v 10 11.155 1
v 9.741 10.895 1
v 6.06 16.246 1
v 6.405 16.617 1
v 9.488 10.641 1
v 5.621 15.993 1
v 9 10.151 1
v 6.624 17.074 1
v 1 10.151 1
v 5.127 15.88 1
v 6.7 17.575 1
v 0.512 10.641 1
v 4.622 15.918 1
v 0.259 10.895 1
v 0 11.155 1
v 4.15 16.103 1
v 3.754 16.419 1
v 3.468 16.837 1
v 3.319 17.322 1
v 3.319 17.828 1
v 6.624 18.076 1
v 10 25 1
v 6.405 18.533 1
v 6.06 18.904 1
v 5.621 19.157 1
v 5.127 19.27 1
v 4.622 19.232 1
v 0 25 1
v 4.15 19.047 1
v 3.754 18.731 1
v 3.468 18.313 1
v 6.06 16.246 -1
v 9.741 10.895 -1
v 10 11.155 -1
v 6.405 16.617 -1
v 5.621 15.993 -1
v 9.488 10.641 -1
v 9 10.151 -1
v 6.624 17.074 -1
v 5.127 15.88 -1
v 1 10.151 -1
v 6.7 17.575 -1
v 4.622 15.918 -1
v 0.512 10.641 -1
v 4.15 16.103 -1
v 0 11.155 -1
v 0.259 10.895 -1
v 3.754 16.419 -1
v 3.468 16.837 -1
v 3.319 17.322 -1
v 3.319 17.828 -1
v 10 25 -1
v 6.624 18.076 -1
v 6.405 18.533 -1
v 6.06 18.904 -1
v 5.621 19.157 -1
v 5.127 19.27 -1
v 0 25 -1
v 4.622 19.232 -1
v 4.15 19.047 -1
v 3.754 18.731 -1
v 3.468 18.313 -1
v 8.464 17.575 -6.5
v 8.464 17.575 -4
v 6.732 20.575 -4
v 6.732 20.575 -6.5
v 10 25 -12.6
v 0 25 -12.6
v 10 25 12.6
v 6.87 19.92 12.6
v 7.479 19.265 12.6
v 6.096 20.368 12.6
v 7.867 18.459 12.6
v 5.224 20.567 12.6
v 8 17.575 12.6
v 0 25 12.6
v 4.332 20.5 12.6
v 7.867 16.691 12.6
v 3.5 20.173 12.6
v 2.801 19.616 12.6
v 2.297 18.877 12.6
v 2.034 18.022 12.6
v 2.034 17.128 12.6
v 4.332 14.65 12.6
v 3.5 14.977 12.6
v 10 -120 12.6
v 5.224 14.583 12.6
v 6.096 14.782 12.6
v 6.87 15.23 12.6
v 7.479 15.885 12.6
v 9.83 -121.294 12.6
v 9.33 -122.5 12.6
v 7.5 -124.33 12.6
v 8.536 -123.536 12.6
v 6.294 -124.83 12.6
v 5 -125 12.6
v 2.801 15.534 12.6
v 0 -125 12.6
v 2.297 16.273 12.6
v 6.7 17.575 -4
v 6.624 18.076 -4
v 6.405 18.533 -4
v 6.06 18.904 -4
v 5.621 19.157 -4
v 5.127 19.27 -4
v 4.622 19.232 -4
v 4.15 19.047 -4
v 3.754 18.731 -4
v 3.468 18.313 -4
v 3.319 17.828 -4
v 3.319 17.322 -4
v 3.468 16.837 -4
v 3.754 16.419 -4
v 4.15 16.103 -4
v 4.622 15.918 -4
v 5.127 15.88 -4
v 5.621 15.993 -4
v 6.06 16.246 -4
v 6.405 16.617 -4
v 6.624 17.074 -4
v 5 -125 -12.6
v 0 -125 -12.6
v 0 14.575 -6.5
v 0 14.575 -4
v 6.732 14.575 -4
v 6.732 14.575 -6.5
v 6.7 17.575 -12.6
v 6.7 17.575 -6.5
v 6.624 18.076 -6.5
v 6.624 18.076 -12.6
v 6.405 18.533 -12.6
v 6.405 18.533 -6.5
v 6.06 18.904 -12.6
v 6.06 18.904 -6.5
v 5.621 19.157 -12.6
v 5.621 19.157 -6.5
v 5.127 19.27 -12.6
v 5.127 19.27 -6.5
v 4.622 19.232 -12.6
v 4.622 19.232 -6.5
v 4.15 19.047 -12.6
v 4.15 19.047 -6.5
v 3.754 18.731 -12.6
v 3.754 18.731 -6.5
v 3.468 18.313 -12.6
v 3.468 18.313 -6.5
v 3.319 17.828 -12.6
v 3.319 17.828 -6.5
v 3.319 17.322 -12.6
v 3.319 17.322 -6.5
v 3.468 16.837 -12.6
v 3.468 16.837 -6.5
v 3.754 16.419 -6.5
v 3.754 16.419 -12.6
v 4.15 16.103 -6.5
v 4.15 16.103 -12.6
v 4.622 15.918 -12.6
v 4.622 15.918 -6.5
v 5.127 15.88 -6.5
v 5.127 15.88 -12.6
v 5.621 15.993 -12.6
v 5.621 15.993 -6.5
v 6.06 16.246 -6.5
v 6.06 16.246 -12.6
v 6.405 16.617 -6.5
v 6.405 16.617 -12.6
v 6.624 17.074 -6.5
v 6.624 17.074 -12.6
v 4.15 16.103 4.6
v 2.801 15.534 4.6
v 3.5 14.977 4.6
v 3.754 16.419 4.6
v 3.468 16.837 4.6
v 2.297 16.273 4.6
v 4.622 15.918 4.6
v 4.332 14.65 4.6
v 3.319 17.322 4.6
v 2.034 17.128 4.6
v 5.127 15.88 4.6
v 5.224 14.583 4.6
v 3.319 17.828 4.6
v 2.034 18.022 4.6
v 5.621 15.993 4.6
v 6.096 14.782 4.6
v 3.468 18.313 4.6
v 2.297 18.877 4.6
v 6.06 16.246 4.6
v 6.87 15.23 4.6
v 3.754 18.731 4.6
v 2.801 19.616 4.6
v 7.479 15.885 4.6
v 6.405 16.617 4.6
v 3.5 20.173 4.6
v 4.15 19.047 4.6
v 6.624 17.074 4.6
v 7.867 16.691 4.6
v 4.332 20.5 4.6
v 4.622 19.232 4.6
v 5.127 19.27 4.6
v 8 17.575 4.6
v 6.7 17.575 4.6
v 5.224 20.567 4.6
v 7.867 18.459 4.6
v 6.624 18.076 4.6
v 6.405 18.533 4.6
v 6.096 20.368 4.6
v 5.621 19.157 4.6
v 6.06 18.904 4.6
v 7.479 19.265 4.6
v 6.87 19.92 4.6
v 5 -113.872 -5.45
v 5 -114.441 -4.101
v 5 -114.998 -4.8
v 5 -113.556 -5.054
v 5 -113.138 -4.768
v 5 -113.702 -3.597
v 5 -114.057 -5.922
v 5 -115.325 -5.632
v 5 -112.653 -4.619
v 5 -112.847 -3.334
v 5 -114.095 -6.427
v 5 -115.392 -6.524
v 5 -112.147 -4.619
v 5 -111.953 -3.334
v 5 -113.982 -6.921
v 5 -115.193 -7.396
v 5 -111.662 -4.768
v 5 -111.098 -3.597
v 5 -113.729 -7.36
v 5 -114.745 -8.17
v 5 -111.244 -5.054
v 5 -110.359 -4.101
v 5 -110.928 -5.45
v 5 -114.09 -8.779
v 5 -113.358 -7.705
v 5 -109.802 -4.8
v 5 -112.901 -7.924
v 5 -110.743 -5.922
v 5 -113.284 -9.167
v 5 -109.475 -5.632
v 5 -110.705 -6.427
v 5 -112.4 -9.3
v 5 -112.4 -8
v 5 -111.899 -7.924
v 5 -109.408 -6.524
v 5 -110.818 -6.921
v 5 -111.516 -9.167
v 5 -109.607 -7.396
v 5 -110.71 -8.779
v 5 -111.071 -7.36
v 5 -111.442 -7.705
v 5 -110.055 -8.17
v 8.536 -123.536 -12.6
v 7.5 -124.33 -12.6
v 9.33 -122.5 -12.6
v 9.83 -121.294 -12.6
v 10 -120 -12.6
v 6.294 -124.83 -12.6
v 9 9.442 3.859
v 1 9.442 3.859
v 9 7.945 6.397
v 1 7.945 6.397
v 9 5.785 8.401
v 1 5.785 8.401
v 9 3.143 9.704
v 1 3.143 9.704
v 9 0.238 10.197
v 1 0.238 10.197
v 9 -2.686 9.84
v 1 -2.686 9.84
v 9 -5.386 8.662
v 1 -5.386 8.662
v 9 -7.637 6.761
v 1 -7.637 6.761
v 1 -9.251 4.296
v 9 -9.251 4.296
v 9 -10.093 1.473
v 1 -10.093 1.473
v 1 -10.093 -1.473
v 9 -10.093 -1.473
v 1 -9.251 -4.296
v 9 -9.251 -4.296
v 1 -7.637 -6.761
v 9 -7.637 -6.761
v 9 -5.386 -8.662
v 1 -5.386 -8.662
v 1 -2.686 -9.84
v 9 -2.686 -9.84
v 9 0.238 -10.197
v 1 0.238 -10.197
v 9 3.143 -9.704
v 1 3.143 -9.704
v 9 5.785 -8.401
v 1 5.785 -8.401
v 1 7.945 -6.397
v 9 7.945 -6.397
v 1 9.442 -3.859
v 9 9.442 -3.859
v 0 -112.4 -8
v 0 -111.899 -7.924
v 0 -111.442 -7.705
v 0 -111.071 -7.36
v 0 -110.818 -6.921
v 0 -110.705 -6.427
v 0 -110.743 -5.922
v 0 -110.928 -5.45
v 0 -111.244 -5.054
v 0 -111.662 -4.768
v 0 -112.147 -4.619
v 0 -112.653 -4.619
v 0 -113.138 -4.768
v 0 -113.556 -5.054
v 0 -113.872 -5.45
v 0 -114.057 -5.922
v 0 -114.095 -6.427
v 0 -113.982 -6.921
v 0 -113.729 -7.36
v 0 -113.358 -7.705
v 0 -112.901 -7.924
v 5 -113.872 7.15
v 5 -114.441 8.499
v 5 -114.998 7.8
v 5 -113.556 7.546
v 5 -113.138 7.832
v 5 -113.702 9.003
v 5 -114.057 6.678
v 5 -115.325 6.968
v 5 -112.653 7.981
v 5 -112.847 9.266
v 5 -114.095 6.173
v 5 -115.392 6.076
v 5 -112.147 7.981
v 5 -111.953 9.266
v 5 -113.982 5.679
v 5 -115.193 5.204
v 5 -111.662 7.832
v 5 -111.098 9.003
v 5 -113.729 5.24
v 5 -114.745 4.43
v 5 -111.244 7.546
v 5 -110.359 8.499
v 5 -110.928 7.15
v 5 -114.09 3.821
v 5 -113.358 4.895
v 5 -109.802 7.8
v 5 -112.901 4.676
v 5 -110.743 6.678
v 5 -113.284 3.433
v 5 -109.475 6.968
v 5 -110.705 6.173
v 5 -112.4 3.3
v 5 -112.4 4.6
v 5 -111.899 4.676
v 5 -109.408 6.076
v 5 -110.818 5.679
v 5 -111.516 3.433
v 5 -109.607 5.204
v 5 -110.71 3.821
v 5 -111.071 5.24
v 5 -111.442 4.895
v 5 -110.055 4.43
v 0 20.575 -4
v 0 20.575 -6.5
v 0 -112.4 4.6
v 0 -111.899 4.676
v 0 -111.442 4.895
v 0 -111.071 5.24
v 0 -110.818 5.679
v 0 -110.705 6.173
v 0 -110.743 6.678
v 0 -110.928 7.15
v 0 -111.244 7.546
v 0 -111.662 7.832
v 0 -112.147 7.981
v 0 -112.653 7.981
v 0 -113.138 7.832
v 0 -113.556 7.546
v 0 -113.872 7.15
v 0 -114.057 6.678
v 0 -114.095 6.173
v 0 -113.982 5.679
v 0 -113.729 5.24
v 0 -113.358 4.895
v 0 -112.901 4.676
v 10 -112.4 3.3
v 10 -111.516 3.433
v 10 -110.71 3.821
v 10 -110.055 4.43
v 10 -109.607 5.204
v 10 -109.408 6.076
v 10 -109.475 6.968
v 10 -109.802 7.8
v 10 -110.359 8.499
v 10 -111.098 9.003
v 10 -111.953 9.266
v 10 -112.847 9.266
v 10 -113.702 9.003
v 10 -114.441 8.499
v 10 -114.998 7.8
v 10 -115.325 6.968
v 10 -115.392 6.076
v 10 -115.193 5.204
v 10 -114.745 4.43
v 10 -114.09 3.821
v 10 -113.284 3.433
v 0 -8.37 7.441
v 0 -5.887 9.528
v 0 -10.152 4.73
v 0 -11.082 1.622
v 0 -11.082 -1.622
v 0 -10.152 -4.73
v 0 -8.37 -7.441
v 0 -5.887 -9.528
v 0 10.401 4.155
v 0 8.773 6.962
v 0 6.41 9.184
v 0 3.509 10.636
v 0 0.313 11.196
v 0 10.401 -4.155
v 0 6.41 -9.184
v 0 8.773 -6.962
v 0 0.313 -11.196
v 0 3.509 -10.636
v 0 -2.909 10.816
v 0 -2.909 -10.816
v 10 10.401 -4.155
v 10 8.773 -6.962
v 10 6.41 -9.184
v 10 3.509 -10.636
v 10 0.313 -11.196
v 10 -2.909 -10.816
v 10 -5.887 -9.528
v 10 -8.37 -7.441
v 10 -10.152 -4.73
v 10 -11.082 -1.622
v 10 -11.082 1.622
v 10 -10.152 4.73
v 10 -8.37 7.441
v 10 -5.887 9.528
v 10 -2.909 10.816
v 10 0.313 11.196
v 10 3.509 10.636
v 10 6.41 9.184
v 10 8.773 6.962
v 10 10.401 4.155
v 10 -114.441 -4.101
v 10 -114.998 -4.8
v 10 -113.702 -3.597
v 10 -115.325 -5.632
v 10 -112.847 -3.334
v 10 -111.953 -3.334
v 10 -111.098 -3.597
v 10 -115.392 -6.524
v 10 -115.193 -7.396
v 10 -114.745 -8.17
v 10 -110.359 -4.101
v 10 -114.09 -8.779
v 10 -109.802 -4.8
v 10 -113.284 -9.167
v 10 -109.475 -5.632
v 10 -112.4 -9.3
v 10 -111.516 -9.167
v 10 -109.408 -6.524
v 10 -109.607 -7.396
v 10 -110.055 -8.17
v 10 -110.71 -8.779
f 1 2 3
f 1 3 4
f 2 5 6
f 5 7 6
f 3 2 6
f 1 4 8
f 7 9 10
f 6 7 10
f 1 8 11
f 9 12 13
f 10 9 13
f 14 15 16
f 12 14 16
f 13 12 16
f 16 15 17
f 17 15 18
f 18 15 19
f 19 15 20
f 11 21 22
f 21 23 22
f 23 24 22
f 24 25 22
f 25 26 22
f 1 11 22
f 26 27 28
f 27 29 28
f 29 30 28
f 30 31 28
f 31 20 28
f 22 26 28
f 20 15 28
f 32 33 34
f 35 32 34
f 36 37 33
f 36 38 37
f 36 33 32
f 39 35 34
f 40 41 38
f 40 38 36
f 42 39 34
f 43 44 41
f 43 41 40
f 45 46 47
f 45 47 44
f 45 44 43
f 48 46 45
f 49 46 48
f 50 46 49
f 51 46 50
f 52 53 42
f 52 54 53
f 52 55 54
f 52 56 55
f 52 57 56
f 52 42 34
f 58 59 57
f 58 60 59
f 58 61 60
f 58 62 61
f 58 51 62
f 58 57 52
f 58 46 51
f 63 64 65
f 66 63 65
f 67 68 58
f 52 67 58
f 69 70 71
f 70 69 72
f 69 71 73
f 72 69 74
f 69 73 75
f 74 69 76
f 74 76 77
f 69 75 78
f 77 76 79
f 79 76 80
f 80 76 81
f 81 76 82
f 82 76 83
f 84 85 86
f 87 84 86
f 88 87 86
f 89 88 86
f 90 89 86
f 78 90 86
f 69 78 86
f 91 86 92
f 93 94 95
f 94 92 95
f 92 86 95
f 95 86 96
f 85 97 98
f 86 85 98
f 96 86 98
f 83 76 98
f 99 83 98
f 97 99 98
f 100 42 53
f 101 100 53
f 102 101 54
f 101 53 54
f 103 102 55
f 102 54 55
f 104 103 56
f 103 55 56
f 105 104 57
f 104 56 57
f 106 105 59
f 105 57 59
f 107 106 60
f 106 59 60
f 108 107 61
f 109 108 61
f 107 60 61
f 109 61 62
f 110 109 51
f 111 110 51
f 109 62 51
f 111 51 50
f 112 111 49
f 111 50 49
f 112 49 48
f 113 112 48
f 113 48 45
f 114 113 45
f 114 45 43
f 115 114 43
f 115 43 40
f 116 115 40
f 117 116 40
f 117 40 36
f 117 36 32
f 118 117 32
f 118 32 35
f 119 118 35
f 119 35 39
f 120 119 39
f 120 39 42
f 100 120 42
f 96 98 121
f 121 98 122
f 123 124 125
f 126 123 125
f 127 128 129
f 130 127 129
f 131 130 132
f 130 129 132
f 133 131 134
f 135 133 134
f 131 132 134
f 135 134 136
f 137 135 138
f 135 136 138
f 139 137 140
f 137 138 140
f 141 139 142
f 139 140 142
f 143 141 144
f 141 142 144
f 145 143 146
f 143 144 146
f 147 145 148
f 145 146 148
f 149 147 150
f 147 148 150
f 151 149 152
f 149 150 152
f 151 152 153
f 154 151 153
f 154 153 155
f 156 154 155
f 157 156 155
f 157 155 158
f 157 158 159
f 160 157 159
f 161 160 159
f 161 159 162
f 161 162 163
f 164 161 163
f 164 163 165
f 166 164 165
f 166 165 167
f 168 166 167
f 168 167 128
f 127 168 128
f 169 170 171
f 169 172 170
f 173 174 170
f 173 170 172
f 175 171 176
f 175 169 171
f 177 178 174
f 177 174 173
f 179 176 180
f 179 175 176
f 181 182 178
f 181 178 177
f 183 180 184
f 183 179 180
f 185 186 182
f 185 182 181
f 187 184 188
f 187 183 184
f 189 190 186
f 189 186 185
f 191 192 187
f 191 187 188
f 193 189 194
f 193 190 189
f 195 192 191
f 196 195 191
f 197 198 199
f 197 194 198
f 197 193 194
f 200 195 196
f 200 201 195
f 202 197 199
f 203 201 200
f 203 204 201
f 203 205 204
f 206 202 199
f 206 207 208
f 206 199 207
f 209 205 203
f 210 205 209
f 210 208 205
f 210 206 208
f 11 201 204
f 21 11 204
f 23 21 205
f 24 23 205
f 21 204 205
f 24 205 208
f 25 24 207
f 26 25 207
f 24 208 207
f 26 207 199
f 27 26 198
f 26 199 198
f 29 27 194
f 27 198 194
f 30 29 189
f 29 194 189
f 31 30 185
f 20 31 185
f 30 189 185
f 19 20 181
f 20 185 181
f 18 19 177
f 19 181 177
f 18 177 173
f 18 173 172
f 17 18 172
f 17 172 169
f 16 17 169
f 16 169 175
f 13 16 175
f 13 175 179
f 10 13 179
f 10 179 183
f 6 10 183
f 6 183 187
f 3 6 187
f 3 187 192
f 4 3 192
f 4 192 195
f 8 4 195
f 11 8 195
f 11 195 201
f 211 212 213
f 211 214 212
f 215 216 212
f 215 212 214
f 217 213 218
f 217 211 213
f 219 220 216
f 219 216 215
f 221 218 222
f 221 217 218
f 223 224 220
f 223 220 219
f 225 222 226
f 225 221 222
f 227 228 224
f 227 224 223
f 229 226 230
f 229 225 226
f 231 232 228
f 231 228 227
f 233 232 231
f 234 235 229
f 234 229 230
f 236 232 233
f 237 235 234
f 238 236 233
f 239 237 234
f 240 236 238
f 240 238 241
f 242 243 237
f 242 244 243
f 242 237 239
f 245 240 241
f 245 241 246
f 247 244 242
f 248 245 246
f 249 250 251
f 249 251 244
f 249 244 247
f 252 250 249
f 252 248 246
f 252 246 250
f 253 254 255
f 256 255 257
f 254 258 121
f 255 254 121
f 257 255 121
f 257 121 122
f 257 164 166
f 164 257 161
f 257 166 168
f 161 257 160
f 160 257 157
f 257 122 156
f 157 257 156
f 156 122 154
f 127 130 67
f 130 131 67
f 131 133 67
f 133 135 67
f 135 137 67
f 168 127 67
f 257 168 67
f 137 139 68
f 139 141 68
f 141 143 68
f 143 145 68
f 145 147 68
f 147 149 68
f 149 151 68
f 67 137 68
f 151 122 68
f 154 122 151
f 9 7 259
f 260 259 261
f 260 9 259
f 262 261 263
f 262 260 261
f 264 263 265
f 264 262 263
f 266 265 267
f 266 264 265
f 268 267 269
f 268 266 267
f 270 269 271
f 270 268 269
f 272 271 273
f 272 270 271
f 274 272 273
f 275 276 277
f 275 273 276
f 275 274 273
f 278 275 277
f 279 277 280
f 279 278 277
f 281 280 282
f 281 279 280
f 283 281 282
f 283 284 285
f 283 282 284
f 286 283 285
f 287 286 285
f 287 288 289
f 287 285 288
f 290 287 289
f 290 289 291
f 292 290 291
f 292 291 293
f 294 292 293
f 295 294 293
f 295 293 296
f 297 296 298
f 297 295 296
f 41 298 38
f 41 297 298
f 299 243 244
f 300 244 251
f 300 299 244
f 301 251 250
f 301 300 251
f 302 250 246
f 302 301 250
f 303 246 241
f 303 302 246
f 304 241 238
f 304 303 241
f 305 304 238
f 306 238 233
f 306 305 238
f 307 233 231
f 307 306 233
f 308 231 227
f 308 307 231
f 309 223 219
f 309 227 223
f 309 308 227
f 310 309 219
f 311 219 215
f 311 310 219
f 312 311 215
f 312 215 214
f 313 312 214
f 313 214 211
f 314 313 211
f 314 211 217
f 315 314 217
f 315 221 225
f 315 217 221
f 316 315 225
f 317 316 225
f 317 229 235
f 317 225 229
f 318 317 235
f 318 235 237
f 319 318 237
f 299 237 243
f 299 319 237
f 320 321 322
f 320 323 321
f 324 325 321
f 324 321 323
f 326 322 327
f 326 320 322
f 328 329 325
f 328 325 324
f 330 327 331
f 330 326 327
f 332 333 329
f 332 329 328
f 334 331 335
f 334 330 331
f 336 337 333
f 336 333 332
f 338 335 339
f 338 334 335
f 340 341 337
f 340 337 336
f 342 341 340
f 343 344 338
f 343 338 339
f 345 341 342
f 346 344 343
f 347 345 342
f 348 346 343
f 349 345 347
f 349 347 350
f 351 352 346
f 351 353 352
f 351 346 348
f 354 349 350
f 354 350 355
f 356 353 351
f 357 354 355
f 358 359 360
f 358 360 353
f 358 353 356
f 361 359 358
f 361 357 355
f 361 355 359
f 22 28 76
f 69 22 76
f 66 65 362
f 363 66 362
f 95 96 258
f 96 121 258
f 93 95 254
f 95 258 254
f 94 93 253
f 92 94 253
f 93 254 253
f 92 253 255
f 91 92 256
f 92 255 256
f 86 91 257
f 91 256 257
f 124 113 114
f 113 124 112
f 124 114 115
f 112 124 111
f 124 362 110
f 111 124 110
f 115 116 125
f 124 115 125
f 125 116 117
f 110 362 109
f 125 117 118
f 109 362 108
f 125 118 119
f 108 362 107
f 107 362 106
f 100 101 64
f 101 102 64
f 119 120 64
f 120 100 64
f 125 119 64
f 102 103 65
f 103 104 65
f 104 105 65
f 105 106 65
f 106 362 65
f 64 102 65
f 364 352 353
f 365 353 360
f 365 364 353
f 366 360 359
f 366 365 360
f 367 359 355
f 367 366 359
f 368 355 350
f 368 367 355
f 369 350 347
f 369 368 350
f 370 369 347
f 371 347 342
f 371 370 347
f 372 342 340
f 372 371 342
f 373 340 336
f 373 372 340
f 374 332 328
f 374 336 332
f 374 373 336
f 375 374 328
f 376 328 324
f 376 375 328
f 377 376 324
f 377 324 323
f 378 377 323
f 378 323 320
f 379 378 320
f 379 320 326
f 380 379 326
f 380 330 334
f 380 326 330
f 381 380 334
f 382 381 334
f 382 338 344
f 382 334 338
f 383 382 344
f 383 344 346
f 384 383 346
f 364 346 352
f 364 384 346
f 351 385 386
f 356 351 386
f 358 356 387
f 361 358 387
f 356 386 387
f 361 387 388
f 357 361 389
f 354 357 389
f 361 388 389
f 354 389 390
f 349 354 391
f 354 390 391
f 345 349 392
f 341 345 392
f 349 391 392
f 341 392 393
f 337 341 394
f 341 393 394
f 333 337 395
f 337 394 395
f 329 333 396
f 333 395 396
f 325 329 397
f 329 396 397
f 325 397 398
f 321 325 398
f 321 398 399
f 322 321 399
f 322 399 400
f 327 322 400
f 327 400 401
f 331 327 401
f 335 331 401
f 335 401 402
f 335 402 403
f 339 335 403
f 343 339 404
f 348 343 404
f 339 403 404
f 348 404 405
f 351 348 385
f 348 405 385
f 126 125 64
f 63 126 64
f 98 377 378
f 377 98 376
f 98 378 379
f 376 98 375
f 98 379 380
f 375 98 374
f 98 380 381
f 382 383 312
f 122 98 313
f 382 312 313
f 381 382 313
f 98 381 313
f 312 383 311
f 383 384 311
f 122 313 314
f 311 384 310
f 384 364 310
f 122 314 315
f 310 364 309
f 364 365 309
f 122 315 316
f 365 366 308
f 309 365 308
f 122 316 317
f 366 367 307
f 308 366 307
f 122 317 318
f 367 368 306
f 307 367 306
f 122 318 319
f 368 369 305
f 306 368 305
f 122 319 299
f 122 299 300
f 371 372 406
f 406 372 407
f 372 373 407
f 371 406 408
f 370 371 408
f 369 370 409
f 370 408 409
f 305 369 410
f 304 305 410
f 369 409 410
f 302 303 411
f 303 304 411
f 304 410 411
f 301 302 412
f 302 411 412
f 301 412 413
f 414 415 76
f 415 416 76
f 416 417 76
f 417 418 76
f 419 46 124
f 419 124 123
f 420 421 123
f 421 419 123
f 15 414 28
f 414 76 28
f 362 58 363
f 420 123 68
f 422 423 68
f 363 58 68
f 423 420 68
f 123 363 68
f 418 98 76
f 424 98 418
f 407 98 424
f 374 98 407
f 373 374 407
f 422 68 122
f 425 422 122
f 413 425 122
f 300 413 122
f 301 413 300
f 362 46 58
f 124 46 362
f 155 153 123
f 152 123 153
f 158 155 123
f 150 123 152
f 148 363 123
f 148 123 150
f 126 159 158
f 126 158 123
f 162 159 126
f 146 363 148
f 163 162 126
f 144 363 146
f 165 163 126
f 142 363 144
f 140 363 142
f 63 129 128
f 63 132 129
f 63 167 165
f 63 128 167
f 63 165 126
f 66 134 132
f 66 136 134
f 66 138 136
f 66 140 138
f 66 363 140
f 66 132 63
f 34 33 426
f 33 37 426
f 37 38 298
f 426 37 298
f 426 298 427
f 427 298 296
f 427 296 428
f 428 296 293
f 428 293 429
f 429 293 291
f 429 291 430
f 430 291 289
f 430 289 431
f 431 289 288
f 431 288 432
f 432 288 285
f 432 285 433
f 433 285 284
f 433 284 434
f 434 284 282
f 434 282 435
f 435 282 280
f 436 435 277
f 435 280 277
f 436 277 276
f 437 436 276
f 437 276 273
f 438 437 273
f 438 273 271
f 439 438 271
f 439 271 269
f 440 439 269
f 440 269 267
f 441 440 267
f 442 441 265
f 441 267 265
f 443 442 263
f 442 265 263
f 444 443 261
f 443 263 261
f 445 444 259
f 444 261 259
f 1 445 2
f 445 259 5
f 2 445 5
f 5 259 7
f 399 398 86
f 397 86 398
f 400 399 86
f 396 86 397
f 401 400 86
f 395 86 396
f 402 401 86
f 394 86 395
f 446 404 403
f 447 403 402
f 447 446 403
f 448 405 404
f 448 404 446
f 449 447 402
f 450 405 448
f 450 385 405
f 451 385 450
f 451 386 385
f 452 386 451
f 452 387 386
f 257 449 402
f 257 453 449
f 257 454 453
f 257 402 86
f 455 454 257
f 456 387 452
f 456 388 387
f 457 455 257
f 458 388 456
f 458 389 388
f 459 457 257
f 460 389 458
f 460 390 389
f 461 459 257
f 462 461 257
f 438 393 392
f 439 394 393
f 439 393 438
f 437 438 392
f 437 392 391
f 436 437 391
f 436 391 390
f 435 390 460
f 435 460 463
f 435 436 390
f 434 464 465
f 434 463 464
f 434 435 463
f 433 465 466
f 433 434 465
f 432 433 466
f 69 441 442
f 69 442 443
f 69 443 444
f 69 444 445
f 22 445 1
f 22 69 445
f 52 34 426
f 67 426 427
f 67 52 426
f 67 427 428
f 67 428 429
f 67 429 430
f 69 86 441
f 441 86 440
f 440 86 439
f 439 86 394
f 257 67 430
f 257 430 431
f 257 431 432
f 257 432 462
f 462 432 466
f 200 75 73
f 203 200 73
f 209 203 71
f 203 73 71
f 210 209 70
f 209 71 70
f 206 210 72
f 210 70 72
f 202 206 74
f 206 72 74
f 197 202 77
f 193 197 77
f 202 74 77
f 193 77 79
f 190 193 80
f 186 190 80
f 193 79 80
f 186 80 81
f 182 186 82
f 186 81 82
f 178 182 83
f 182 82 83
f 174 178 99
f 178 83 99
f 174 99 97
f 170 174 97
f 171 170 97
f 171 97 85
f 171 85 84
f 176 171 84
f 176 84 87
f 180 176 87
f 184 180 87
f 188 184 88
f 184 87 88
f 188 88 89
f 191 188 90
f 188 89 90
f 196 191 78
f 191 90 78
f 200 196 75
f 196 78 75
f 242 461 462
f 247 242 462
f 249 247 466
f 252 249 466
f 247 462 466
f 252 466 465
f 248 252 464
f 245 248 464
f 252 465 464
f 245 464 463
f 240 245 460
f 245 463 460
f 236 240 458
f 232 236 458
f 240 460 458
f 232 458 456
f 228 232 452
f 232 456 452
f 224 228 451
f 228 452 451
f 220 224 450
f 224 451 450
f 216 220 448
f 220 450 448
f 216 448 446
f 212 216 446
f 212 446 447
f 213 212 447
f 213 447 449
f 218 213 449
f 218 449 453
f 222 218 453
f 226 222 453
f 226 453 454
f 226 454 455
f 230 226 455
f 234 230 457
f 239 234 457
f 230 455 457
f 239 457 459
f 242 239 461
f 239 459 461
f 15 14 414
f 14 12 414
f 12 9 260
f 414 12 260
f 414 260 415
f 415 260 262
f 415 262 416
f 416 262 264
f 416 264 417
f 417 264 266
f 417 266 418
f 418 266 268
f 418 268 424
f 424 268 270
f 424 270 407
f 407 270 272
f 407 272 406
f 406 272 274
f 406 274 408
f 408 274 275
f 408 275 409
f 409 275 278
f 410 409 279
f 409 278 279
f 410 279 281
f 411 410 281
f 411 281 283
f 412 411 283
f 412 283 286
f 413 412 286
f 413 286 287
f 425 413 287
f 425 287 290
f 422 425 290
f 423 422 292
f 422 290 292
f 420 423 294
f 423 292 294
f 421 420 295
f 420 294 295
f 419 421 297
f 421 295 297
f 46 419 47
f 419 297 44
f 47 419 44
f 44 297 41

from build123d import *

# Parameters (mm, degrees)
SKETCH1_R           = 10.2
BOSS_EXTRUDE1_DEPTH = 10
SKETCH2_R           = 1.7
CUT_EXTRUDE2_DEPTH  = 127.030789889
SKETCH5_W           = 2
SKETCH5_H           = 25
CUT_EXTRUDE4_DEPTH  = 127.030789889
SKETCH7_R           = 1.7
CUT_EXTRUDE5_DEPTH  = 128.906372007
CUT_EXTRUDE7_DEPTH  = 2.5
FILLET1_R           = 5
CHAMFER1_SIZE       = 1
SKETCH9_R           = 3
CUT_EXTRUDE8_DEPTH  = 8
SKETCH13_R          = 3
CUT_EXTRUDE9_DEPTH  = 5


with BuildPart() as part:
    # Sketch1 → Boss-Extrude1 (new body)
    with BuildSketch(Plane(origin=(0, 0, 0), x_dir=(0, 0, -1), z_dir=(1, 0, 0))):
        Polygon((-12.6, -25), (-12.6, -125), (12.6, -125), (12.6, -25), (12.6, 25), (-12.6, 25), align=None)
        Circle(SKETCH1_R, mode=Mode.SUBTRACT)
    extrude(amount=BOSS_EXTRUDE1_DEPTH)

    # Sketch2 → Cut-Extrude2 (cut, through all)
    with BuildSketch(Plane(origin=(0, 0, 0), x_dir=(0, 0, -1), z_dir=(1, 0, 0))):
        with Locations((-6.3, -112.4)):
            Circle(SKETCH2_R)
        with Locations((6.3, -112.4)):
            Circle(SKETCH2_R)
    extrude(amount=CUT_EXTRUDE2_DEPTH, mode=Mode.SUBTRACT)

    # Sketch5 → Cut-Extrude4 (cut, through all)
    with BuildSketch(Plane.ZY):
        with Locations((0, 12.5)):
            Rectangle(SKETCH5_W, SKETCH5_H)
    extrude(amount=-CUT_EXTRUDE4_DEPTH, mode=Mode.SUBTRACT)

    # Sketch7 → Cut-Extrude5 (cut, through all)
    with BuildSketch(Plane.XY.offset(12.6)):
        with Locations((5, 17.575)):
            Circle(SKETCH7_R)
    extrude(amount=-CUT_EXTRUDE5_DEPTH, mode=Mode.SUBTRACT)

    # Sketch8 → Cut-Extrude7 (cut)
    with BuildSketch(Plane.XY.offset(-4)):
        Polygon((3.267949192, 20.575), (0, 20.575), (0, 14.575), (3.267949192, 14.575), (6.732050808, 14.575), (8.464101615, 17.575), (6.732050808, 20.575), align=None)
    extrude(amount=-CUT_EXTRUDE7_DEPTH, mode=Mode.SUBTRACT)

    # Fillet1
    fillet1_edges = [part.edges().sort_by_distance(p)[0] for p in [
        (10, -125, 0),
    ]]
    fillet(fillet1_edges, radius=FILLET1_R)

    # Chamfer1
    chamfer1_edges = [part.edges().sort_by_distance(p)[0] for p in [
        (10, -10.2, 0),
        (0, -10.2, 0),
    ]]
    chamfer(chamfer1_edges, length=CHAMFER1_SIZE)

    # Sketch9 → Cut-Extrude8 (cut)
    with BuildSketch(Plane.XY.offset(12.6)):
        with Locations((5, 17.575)):
            Circle(SKETCH9_R)
    extrude(amount=-CUT_EXTRUDE8_DEPTH, mode=Mode.SUBTRACT)

    # Sketch13 → Cut-Extrude9 (cut)
    with BuildSketch(Plane(origin=(10, 0, 0), x_dir=(0, 0, -1), z_dir=(1, 0, 0))):
        with Locations((6.3, -112.4)):
            Circle(SKETCH13_R)
        with Locations((-6.3, -112.4)):
            Circle(SKETCH13_R)
    extrude(amount=-CUT_EXTRUDE9_DEPTH, mode=Mode.SUBTRACT)


solid = part.part
